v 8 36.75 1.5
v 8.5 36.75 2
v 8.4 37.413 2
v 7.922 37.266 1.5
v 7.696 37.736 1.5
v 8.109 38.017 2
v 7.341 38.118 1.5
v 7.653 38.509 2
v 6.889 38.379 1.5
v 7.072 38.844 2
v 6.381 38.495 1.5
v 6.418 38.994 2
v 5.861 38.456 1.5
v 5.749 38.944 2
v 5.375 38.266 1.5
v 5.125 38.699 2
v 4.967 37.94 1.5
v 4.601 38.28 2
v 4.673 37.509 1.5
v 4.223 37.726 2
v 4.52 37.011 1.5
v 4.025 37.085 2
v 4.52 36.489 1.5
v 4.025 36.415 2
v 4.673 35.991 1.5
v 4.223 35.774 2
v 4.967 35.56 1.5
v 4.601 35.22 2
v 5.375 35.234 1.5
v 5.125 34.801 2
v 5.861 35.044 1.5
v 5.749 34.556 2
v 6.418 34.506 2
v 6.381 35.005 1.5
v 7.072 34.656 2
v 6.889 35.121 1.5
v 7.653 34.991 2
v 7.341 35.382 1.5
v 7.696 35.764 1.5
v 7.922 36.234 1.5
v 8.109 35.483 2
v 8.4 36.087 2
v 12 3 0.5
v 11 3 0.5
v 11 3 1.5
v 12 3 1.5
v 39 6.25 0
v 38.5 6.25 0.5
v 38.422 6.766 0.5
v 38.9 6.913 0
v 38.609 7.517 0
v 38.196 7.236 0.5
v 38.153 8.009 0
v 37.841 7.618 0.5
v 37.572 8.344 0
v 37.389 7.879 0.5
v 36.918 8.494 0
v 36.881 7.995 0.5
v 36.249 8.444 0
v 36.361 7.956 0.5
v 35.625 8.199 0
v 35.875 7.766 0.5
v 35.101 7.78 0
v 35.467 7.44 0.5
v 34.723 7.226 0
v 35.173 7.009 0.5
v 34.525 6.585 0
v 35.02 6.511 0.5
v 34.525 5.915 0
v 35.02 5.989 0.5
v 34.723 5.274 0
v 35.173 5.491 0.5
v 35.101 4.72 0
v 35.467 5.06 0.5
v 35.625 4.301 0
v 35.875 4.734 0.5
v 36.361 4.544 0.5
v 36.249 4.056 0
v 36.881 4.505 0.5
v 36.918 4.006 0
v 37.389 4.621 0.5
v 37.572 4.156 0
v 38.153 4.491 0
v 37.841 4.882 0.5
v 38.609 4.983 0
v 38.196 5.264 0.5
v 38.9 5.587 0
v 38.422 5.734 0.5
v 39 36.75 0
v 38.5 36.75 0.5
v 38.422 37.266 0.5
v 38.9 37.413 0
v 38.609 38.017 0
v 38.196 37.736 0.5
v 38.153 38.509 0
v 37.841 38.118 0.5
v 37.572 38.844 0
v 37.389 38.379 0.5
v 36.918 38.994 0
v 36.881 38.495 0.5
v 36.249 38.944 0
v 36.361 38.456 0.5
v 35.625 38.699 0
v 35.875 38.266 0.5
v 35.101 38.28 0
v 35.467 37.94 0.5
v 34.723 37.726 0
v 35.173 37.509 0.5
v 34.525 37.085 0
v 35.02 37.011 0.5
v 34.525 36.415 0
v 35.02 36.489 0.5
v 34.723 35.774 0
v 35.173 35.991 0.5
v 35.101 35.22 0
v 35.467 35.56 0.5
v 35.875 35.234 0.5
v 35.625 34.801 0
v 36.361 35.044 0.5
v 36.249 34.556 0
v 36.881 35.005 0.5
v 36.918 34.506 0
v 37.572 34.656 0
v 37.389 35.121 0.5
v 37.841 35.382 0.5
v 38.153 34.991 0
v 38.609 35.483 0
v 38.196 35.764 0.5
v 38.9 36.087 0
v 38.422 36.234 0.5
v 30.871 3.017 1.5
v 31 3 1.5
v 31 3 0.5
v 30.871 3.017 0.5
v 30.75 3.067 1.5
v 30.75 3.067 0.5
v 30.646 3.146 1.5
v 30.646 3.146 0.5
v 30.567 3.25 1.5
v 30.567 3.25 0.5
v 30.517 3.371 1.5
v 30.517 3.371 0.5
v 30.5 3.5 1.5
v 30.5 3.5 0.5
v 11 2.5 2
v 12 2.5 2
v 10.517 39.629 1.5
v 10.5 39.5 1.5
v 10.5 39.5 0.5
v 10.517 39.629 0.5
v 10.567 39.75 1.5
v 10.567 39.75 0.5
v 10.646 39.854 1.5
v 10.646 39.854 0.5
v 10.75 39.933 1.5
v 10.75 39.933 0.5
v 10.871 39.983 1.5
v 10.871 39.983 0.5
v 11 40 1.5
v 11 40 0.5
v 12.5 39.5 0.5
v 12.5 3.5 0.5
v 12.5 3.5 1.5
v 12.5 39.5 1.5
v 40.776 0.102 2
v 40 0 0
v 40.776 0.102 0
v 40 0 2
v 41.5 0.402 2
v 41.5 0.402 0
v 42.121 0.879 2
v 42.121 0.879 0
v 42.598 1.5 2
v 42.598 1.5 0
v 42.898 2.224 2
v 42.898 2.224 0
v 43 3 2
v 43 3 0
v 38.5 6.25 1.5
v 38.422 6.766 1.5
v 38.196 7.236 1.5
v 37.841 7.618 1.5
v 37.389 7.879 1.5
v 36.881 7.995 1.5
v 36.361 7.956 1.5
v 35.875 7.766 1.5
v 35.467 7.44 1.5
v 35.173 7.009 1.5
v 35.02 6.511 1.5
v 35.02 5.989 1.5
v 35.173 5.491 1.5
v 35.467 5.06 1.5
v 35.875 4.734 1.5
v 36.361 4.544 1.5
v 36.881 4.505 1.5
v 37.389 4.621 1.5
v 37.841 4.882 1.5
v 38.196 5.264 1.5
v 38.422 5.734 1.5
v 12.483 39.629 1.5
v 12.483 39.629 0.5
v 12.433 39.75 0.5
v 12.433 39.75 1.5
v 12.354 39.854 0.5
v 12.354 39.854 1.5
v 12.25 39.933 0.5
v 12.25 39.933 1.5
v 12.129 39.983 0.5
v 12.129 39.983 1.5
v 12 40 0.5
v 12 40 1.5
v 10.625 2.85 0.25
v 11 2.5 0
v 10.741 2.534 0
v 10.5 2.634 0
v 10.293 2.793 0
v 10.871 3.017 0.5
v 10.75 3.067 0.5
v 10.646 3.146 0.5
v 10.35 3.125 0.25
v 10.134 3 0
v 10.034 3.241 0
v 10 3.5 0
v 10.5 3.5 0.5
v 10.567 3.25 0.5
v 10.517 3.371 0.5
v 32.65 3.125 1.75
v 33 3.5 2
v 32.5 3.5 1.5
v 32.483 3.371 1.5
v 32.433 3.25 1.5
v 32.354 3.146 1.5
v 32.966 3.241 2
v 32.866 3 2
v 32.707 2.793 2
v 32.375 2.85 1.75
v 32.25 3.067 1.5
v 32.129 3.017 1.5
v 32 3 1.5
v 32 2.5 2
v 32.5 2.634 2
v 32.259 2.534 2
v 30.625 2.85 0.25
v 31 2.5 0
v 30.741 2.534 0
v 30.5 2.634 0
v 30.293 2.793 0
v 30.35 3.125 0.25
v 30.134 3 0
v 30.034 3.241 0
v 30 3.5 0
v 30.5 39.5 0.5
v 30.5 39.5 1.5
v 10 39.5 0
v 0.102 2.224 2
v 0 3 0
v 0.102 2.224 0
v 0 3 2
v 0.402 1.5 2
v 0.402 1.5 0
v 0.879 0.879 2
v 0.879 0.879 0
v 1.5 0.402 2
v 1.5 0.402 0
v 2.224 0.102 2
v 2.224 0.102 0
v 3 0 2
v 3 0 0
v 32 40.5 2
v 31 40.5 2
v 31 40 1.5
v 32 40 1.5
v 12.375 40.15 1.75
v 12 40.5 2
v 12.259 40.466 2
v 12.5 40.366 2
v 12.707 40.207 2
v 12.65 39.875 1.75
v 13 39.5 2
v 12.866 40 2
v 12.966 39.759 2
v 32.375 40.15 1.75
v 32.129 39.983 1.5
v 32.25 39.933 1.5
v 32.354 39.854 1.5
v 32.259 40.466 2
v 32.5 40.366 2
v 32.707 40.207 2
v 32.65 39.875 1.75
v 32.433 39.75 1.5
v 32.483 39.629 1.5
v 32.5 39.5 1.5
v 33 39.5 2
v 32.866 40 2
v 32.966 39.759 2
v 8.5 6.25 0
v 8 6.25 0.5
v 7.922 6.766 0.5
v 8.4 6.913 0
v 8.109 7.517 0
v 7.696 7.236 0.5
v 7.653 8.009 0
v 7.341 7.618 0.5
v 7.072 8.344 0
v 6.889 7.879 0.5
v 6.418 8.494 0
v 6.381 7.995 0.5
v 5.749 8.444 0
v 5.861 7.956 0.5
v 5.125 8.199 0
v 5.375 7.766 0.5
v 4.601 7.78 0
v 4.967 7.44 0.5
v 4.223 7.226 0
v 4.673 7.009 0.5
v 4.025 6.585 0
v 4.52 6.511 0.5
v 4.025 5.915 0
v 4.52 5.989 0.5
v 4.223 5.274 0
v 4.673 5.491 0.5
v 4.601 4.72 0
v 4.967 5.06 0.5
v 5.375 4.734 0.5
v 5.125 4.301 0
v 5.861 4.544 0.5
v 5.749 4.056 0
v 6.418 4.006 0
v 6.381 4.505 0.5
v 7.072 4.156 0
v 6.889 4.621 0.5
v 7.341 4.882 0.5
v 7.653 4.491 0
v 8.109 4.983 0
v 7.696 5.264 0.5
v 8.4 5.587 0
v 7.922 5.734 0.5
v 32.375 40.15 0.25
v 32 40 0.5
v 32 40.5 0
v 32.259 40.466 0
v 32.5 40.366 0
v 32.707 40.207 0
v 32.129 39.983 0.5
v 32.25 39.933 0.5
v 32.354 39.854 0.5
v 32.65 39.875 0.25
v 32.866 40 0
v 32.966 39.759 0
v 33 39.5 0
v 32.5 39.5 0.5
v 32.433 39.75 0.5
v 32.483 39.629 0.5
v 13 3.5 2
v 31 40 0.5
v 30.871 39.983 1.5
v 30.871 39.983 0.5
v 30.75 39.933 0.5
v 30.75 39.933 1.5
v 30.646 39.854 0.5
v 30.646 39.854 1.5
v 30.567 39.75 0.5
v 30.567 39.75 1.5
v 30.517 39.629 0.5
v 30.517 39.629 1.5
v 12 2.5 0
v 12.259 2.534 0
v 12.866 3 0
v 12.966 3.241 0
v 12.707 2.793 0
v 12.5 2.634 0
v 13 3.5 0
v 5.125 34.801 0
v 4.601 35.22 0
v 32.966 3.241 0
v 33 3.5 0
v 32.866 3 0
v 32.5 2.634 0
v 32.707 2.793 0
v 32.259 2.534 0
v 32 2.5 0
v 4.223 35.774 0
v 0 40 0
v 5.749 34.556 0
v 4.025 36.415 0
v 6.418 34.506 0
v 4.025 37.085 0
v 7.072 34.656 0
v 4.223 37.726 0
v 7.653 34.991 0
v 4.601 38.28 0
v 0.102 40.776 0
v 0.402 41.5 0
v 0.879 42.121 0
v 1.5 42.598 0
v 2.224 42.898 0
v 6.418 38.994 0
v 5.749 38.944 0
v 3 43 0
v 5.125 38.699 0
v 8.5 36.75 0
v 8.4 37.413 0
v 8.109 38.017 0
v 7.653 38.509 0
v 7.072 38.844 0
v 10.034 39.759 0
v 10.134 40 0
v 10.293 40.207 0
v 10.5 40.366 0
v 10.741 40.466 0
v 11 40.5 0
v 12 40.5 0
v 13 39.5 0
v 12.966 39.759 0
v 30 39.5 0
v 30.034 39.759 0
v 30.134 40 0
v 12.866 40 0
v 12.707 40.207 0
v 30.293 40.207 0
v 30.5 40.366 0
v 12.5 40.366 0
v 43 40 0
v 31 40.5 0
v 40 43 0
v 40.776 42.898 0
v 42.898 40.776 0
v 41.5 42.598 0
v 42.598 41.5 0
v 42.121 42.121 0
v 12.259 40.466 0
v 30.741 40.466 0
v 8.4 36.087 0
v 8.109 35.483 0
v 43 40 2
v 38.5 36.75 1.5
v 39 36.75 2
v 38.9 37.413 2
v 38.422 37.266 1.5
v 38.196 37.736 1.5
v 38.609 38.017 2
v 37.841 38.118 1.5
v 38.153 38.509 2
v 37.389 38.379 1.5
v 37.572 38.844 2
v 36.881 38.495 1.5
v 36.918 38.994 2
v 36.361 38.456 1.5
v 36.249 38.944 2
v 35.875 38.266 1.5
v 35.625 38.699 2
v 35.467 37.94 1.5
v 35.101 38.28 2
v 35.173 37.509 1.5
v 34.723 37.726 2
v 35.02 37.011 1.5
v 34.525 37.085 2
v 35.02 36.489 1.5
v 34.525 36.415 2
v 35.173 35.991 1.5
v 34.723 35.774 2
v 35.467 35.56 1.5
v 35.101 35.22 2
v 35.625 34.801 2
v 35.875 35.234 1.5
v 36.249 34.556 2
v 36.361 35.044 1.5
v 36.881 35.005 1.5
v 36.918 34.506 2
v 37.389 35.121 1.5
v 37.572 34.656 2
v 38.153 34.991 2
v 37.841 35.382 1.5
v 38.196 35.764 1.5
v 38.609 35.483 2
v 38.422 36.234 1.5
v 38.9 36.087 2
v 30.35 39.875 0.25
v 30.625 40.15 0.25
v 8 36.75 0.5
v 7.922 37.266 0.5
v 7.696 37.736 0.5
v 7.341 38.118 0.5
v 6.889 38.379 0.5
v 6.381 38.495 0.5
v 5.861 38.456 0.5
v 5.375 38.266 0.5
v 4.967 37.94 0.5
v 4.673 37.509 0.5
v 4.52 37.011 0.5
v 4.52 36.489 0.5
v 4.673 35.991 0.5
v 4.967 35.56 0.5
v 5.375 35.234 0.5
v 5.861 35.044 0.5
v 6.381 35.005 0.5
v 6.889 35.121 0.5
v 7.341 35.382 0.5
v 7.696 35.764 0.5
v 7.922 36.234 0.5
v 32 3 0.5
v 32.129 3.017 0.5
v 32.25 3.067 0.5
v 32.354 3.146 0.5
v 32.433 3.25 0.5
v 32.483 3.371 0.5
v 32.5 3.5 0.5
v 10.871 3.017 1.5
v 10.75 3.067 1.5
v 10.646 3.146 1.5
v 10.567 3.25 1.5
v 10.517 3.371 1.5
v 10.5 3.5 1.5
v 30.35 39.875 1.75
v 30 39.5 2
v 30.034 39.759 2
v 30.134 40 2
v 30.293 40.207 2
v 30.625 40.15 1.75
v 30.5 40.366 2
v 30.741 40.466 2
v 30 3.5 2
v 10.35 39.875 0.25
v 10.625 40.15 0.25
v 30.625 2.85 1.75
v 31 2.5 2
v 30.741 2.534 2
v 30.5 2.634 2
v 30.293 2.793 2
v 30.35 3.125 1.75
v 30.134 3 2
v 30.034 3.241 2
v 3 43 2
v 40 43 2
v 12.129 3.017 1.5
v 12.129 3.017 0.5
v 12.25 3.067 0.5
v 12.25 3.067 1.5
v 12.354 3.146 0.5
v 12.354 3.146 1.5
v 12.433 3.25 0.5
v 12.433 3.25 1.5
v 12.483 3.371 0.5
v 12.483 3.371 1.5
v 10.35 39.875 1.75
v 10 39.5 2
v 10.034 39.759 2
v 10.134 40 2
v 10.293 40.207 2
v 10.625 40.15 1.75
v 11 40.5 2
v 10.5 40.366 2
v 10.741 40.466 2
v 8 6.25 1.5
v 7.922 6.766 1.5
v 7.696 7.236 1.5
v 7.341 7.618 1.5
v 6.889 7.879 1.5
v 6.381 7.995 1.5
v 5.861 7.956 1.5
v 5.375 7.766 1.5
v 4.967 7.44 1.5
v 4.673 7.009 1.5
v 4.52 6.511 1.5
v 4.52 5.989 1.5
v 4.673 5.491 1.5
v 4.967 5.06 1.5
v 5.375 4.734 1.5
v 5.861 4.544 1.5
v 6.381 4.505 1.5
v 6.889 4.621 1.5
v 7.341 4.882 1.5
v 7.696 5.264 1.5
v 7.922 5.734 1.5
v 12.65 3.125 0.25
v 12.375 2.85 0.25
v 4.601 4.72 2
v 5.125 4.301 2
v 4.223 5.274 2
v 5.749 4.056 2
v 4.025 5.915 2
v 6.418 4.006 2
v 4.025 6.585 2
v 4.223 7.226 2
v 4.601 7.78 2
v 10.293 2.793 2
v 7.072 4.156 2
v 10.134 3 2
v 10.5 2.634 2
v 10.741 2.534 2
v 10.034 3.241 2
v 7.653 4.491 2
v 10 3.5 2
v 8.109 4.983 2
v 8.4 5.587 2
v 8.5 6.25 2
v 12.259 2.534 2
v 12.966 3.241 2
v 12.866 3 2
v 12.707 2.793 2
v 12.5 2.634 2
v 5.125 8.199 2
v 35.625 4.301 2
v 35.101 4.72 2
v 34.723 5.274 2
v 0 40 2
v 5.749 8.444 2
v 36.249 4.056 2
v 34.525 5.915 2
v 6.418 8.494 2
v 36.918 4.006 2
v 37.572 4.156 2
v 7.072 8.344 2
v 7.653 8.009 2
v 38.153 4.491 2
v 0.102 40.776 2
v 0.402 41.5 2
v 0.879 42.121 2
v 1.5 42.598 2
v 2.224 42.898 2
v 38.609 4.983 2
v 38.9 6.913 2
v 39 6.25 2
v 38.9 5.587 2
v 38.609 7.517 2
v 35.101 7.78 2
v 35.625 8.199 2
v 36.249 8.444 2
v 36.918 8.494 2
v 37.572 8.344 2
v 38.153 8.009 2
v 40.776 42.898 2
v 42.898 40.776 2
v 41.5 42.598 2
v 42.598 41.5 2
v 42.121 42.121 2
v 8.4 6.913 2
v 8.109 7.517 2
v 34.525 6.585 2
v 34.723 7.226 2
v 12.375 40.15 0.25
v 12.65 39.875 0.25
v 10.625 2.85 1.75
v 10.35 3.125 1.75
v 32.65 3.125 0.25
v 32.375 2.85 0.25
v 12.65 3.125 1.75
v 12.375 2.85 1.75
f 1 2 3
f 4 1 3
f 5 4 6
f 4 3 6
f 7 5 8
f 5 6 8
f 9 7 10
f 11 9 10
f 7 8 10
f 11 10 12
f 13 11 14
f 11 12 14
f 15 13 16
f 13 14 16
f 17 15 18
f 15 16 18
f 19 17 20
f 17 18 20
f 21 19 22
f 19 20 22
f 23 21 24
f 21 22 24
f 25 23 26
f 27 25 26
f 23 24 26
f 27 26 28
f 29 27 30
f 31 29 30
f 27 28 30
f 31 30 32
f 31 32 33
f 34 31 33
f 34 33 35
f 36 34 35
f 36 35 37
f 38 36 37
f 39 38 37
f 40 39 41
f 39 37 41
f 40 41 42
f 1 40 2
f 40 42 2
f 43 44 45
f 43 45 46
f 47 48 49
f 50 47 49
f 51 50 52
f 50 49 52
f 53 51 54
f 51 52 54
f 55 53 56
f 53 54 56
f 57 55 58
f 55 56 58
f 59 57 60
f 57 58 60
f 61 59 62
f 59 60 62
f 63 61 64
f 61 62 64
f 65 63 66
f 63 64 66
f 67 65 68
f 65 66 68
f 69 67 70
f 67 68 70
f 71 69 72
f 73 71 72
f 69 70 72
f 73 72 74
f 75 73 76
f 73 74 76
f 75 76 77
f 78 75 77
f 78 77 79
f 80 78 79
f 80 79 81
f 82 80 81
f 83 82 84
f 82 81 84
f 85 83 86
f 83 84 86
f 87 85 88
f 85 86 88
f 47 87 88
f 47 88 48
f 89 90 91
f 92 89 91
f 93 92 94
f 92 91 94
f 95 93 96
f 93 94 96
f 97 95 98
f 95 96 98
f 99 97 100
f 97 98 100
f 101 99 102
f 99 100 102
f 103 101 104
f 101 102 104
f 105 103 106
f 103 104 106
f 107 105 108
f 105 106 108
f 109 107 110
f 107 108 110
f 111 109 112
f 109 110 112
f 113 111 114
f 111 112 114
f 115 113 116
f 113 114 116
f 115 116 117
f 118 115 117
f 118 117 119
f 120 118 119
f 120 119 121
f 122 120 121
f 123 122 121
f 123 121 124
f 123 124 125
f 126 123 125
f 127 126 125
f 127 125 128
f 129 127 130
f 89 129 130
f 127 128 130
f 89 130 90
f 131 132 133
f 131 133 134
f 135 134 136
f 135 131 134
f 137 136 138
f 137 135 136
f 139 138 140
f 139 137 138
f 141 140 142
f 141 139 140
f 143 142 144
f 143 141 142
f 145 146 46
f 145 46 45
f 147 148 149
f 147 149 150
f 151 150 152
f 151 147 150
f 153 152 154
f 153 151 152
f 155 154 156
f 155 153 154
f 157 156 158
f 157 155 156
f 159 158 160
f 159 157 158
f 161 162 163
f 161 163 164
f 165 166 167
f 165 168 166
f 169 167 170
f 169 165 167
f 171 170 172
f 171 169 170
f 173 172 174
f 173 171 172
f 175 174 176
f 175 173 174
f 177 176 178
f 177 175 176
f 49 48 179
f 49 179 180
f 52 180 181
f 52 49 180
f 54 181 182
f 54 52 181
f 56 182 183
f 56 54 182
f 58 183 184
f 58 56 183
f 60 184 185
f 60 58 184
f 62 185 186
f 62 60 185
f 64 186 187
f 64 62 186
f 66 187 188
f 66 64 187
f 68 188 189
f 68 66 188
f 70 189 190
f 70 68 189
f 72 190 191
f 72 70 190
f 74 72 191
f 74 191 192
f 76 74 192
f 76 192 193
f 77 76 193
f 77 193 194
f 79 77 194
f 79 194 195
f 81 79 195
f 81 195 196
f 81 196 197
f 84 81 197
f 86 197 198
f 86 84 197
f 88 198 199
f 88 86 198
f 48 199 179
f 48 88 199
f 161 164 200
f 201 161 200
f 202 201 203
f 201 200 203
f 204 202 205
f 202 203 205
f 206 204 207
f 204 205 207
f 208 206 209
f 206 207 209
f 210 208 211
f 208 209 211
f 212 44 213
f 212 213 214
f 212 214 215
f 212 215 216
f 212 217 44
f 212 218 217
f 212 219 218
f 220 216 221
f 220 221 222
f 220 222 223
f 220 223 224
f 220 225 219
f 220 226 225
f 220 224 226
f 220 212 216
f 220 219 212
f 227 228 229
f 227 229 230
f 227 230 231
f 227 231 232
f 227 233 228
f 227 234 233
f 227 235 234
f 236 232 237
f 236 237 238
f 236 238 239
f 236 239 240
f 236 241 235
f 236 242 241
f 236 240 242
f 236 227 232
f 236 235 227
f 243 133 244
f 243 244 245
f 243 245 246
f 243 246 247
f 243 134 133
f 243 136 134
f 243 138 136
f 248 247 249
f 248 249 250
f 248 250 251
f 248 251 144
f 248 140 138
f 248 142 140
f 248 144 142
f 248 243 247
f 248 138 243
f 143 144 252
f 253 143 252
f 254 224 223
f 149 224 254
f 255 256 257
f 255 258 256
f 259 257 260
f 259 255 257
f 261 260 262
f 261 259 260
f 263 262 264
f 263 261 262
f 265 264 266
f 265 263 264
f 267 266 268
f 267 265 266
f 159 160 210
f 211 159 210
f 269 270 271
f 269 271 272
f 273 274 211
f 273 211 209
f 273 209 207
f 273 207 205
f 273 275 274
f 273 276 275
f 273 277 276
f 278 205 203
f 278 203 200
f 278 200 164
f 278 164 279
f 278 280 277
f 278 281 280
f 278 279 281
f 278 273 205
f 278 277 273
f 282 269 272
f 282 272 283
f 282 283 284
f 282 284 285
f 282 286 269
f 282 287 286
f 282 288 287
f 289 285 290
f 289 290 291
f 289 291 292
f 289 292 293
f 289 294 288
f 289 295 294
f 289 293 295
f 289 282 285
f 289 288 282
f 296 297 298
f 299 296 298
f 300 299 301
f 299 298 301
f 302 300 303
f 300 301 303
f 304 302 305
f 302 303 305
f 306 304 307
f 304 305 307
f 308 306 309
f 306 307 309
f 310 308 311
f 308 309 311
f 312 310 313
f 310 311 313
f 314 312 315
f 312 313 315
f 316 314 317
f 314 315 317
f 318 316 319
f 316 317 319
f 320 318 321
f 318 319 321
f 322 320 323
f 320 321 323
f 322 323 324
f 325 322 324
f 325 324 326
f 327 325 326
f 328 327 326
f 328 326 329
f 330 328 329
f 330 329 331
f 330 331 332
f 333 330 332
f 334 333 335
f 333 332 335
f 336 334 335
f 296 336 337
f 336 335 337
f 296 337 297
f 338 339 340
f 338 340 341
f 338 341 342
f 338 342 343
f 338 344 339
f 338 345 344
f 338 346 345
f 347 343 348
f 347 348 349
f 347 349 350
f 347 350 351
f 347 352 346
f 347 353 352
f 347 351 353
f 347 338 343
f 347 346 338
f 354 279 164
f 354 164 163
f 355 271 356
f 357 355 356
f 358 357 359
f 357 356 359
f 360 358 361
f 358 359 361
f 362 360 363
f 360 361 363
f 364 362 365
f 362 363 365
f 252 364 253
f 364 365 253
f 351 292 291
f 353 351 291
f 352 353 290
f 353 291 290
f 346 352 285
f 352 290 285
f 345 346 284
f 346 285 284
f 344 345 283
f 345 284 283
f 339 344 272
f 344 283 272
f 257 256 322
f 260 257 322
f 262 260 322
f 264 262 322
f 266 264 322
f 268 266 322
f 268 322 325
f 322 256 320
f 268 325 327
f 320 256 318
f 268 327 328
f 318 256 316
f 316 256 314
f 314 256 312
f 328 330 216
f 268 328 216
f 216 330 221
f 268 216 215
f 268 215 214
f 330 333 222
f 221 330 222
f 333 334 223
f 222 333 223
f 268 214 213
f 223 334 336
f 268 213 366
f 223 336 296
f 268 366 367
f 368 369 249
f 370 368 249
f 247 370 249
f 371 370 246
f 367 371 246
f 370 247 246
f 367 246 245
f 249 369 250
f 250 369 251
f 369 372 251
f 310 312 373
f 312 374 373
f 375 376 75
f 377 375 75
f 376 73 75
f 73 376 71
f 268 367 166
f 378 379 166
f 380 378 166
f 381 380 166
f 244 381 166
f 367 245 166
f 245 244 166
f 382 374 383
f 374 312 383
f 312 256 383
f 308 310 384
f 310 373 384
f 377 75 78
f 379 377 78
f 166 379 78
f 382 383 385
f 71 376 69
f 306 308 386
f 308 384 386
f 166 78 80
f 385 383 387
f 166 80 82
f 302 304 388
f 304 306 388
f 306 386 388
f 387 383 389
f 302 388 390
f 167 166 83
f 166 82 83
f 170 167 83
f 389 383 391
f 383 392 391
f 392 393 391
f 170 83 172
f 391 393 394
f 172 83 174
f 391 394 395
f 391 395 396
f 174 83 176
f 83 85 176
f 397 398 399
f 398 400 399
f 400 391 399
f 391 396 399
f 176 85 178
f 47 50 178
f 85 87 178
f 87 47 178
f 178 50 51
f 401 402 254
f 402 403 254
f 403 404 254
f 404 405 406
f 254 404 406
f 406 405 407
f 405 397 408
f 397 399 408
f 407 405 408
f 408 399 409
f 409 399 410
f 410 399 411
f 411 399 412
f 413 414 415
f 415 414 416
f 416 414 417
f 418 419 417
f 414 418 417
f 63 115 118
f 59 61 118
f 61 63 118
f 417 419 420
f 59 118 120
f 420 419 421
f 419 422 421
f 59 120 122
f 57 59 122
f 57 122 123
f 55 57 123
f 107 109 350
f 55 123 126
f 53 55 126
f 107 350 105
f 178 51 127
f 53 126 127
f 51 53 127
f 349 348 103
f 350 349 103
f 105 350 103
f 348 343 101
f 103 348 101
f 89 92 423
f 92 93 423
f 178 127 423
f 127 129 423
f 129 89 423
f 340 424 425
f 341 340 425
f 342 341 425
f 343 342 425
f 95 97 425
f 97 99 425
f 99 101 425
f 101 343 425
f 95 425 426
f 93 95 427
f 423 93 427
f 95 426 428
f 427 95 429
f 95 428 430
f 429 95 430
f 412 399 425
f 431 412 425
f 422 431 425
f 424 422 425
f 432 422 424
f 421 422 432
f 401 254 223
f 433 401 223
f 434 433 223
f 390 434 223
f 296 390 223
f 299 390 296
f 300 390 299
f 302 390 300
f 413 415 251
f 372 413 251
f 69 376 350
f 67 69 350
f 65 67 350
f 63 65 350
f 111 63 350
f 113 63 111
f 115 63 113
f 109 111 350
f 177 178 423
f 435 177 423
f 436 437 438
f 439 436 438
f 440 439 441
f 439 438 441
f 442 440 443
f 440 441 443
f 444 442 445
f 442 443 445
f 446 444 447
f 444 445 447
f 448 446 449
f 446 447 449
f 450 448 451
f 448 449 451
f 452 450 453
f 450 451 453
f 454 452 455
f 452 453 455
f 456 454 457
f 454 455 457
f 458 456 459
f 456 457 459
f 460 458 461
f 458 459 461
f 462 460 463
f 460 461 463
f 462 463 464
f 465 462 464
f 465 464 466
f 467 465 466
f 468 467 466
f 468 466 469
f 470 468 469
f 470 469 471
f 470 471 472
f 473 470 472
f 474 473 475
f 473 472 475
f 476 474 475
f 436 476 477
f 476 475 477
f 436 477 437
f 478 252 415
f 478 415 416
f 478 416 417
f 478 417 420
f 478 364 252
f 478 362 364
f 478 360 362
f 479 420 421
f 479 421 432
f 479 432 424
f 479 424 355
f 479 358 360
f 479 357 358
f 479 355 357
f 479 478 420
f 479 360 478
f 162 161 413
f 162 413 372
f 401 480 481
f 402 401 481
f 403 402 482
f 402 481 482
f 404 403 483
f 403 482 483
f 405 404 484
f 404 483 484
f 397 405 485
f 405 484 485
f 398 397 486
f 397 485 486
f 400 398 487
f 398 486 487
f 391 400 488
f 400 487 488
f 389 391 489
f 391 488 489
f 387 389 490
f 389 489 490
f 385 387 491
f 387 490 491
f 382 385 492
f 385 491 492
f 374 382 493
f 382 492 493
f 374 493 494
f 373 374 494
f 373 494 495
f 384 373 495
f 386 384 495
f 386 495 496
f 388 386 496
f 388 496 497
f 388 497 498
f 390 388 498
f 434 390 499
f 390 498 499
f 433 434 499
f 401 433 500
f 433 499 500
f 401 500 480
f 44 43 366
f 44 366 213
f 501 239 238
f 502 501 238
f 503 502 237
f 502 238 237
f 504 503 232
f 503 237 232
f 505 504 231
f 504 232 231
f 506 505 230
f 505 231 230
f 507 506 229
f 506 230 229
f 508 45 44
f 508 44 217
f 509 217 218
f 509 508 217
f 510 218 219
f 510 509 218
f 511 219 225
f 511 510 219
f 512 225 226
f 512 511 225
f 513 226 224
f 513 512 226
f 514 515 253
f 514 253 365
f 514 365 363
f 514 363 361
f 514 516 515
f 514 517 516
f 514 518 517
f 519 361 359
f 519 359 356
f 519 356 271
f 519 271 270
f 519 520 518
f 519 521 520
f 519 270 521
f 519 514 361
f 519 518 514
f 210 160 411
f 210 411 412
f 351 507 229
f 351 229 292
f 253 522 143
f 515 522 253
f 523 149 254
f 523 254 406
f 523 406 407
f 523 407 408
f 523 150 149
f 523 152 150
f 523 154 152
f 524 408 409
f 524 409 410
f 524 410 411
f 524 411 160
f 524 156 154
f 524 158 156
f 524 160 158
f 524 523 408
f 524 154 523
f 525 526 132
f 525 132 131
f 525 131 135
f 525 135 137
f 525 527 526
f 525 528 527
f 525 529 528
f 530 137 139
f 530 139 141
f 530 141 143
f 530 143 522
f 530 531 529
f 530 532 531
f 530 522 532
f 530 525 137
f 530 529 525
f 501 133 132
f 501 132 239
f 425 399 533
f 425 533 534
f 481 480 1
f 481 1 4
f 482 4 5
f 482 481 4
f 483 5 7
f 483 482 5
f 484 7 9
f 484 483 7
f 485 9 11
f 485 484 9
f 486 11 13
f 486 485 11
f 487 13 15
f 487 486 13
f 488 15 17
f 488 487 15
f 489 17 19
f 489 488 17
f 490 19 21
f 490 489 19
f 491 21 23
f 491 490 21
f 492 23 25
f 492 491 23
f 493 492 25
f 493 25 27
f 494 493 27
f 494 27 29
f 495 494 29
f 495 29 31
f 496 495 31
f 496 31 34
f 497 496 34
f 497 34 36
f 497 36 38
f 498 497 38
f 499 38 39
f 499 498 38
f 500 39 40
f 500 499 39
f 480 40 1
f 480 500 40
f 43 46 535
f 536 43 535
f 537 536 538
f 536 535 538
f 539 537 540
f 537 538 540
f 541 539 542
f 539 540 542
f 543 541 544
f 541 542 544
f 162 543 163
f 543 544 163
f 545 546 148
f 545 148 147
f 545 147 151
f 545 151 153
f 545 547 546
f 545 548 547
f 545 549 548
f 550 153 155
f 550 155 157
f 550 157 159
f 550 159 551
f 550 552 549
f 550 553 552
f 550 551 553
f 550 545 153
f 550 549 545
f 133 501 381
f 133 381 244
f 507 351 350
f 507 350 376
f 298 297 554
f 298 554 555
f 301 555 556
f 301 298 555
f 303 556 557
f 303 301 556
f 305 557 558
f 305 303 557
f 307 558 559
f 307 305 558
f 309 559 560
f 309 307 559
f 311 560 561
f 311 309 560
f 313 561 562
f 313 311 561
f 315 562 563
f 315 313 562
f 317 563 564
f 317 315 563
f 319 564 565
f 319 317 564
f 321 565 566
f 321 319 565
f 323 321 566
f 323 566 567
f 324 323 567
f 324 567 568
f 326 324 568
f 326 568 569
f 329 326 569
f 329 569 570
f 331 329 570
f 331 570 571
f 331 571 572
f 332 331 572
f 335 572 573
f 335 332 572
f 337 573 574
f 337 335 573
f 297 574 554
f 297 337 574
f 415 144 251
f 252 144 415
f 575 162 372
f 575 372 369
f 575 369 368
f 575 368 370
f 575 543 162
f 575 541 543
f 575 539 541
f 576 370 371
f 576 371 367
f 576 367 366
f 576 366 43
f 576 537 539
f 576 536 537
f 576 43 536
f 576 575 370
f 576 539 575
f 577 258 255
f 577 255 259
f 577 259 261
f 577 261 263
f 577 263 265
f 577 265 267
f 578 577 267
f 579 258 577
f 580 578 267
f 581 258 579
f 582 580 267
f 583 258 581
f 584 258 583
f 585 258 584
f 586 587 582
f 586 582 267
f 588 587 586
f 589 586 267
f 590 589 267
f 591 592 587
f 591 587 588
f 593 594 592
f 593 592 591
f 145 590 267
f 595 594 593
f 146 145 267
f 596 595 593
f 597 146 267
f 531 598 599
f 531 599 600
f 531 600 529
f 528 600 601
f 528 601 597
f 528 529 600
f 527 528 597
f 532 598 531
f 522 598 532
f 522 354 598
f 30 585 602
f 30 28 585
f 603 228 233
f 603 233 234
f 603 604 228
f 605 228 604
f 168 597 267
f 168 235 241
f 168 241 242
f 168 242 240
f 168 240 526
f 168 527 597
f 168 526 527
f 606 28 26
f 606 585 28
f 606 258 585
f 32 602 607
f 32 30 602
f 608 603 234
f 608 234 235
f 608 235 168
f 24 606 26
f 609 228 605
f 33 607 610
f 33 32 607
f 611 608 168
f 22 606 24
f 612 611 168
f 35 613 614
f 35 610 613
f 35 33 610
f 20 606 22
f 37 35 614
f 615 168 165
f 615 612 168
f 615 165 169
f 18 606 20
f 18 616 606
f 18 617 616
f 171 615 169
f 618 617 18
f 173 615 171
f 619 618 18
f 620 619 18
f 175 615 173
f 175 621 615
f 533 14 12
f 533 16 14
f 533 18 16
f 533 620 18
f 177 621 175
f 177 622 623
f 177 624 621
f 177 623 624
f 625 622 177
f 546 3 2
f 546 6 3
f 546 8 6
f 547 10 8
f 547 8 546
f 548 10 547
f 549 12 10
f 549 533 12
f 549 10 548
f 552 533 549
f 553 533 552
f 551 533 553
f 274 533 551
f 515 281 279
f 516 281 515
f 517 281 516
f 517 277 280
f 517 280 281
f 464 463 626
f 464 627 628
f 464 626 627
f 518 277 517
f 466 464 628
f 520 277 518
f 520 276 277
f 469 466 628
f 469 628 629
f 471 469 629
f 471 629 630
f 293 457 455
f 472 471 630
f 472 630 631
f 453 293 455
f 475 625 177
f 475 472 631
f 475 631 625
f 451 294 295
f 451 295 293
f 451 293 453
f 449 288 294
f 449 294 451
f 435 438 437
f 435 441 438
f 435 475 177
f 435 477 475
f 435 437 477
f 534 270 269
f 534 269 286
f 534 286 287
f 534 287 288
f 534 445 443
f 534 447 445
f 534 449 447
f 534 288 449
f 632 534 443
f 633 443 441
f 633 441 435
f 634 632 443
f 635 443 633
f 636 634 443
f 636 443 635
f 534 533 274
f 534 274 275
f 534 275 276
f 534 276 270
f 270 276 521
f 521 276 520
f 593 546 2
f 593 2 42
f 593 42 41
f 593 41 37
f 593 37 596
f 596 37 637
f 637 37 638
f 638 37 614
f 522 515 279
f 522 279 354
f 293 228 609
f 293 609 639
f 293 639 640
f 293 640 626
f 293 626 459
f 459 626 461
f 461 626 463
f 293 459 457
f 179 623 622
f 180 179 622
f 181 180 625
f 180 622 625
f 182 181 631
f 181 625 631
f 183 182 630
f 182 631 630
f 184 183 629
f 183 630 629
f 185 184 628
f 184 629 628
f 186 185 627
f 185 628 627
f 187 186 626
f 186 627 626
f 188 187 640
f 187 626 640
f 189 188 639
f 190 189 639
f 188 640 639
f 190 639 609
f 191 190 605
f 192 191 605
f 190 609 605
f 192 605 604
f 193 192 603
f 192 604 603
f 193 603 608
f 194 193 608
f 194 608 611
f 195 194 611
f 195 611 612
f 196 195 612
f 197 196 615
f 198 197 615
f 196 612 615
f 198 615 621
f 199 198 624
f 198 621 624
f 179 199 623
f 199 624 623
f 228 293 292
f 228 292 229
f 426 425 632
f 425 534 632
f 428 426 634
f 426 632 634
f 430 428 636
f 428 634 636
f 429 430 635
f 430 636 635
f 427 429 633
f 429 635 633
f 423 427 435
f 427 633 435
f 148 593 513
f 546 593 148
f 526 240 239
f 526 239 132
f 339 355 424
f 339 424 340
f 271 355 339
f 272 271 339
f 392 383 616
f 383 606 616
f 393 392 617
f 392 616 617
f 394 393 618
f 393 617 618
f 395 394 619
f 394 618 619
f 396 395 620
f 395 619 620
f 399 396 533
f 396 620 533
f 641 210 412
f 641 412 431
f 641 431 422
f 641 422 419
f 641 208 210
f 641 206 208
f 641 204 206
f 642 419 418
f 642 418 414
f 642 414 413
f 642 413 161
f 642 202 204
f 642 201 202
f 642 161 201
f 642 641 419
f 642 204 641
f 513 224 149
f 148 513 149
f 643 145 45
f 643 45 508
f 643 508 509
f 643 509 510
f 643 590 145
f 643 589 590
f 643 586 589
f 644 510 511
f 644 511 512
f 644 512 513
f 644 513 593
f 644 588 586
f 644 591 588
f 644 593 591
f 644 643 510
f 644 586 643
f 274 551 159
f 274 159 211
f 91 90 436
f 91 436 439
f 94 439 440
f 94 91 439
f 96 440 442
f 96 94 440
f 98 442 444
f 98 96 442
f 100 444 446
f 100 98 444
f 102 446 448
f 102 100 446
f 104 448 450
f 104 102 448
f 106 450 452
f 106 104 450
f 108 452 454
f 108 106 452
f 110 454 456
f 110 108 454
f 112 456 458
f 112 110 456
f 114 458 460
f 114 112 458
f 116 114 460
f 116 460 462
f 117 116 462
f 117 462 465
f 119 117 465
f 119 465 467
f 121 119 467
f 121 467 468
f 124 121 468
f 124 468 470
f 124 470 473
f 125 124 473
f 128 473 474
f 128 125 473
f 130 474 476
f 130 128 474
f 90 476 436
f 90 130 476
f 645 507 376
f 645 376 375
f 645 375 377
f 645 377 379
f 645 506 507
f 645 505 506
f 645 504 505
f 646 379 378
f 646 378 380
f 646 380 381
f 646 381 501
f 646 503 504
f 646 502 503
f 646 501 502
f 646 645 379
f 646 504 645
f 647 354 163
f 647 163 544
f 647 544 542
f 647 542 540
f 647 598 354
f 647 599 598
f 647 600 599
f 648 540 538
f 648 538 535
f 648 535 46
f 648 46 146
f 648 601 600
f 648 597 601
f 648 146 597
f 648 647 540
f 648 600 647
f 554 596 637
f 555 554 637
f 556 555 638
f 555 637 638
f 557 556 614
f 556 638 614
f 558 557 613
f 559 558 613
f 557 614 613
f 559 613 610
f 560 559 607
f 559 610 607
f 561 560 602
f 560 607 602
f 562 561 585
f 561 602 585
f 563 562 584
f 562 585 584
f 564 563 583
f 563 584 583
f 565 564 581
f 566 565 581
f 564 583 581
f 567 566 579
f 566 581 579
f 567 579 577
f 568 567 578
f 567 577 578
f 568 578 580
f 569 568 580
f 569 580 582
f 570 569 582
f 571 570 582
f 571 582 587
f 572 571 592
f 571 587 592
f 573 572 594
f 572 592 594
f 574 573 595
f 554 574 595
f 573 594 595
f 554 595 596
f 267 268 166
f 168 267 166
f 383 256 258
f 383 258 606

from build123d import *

# Parameters (mm, degrees)
BOX001_W         = 2
BOX001_H         = 37
BOX001_DEPTH     = 2
BOX_W            = 2
BOX_H            = 37
BOX_DEPTH        = 2
CIRCLE_R         = 1.75
EXTRUDE_DEPTH    = 2
CIRCLE001_R      = 1.75
EXTRUDE001_DEPTH = 2
CIRCLE002_R      = 1.75
EXTRUDE002_DEPTH = 2
CIRCLE003_R      = 1.75
EXTRUDE003_DEPTH = 2
RECTANGLE_W      = 43
RECTANGLE_H      = 43
EXTRUDE004_DEPTH = 2
FILLET_R         = 3
FILLET001_R      = 0.5
CHAMFER_SIZE     = 0.5
CHAMFER001_SIZE  = 0.5


with BuildPart() as cube001:
    # Box001 → Box001 (new body)
    with BuildSketch(Plane(origin=(30.5, 3, 0), x_dir=(1, 0, 0), z_dir=(0, 0, 1))):
        with Locations((1, 18.5)):
            Rectangle(BOX001_W, BOX001_H)
    extrude(amount=BOX001_DEPTH)


with BuildPart() as cube:
    # Box → Box (new body)
    with BuildSketch(Plane(origin=(10.5, 3, 0), x_dir=(1, 0, 0), z_dir=(0, 0, 1))):
        with Locations((1, 18.5)):
            Rectangle(BOX_W, BOX_H)
    extrude(amount=BOX_DEPTH)


with BuildPart() as extrude_body:
    # Circle → Extrude (new body)
    with BuildSketch(Plane(origin=(36.75, 6.25, 0), x_dir=(1, 0, 0), z_dir=(0, 0, 1))):
        Circle(CIRCLE_R)
    extrude(amount=EXTRUDE_DEPTH)


with BuildPart() as extrude001:
    # Circle001 → Extrude001 (new body)
    with BuildSketch(Plane(origin=(36.75, 36.75, 0), x_dir=(1, 0, 0), z_dir=(0, 0, 1))):
        Circle(CIRCLE001_R)
    extrude(amount=EXTRUDE001_DEPTH)


with BuildPart() as extrude002:
    # Circle002 → Extrude002 (new body)
    with BuildSketch(Plane(origin=(6.25, 6.25, 0), x_dir=(1, 0, 0), z_dir=(0, 0, 1))):
        Circle(CIRCLE002_R)
    extrude(amount=EXTRUDE002_DEPTH)


with BuildPart() as extrude003:
    # Circle003 → Extrude003 (new body)
    with BuildSketch(Plane(origin=(6.25, 36.75, 0), x_dir=(1, 0, 0), z_dir=(0, 0, 1))):
        Circle(CIRCLE003_R)
    extrude(amount=EXTRUDE003_DEPTH)


with BuildPart() as chamfer001:
    # Rectangle → Extrude004 (new body)
    with BuildSketch(Plane.XY):
        with Locations((21.5, 21.5)):
            Rectangle(RECTANGLE_W, RECTANGLE_H)
    extrude(amount=EXTRUDE004_DEPTH)

    # Cut: cut Extrude003
    add(extrude003.part, mode=Mode.SUBTRACT)

    # Cut001: cut Extrude002
    add(extrude002.part, mode=Mode.SUBTRACT)

    # Cut002: cut Extrude001
    add(extrude001.part, mode=Mode.SUBTRACT)

    # Cut003: cut Extrude body
    add(extrude_body.part, mode=Mode.SUBTRACT)

    # Cut004: cut Cube
    add(cube.part, mode=Mode.SUBTRACT)

    # Cut005: cut Cube001
    add(cube001.part, mode=Mode.SUBTRACT)

    # Fillet
    fillet_edges = [chamfer001.edges().sort_by_distance(p)[0] for p in [
        (0, 0, 1),
        (43, 0, 1),
        (0, 43, 1),
        (43, 43, 1),
    ]]
    fillet(fillet_edges, radius=FILLET_R)

    # Fillet001
    fillet001_edges = [chamfer001.edges().sort_by_distance(p)[0] for p in [
        (10.5, 3, 1),
        (10.5, 40, 1),
        (12.5, 40, 1),
        (12.5, 3, 1),
        (30.5, 3, 1),
        (30.5, 40, 1),
        (32.5, 3, 1),
        (32.5, 40, 1),
    ]]
    fillet(fillet001_edges, radius=FILLET001_R)

    # Chamfer
    chamfer_edges = [chamfer001.edges().sort_by_distance(p)[0] for p in [
        (10.5, 21.5, 2),
        (10.646447, 3.146447, 2),
        (10.646447, 39.853553, 2),
        (11.5, 3, 2),
        (11.5, 40, 2),
        (12.353553, 3.146447, 2),
        (12.353553, 39.853553, 2),
        (12.5, 21.5, 2),
        (35, 36.75, 2),
        (35, 6.25, 2),
        (4.5, 6.25, 2),
        (4.5, 36.75, 2),
        (30.5, 21.5, 2),
        (30.646447, 3.146447, 2),
        (30.646447, 39.853553, 2),
        (31.5, 3, 2),
        (31.5, 40, 2),
        (32.353553, 3.146447, 2),
        (32.353553, 39.853553, 2),
        (32.5, 21.5, 2),
    ]]
    chamfer(chamfer_edges, length=CHAMFER_SIZE)

    # Chamfer001
    chamfer001_edges = [chamfer001.edges().sort_by_distance(p)[0] for p in [
        (10.5, 21.5, 0),
        (10.646447, 3.146447, 0),
        (10.646447, 39.853553, 0),
        (11.5, 3, 0),
        (11.5, 40, 0),
        (12.353553, 3.146447, 0),
        (12.353553, 39.853553, 0),
        (12.5, 21.5, 0),
        (35, 36.75, 0),
        (35, 6.25, 0),
        (4.5, 6.25, 0),
        (4.5, 36.75, 0),
        (30.5, 21.5, 0),
        (30.646447, 3.146447, 0),
        (30.646447, 39.853553, 0),
        (31.5, 3, 0),
        (31.5, 40, 0),
        (32.353553, 3.146447, 0),
        (32.353553, 39.853553, 0),
        (32.5, 21.5, 0),
    ]]
    chamfer(chamfer001_edges, length=CHAMFER001_SIZE)


solid = chamfer001.part
